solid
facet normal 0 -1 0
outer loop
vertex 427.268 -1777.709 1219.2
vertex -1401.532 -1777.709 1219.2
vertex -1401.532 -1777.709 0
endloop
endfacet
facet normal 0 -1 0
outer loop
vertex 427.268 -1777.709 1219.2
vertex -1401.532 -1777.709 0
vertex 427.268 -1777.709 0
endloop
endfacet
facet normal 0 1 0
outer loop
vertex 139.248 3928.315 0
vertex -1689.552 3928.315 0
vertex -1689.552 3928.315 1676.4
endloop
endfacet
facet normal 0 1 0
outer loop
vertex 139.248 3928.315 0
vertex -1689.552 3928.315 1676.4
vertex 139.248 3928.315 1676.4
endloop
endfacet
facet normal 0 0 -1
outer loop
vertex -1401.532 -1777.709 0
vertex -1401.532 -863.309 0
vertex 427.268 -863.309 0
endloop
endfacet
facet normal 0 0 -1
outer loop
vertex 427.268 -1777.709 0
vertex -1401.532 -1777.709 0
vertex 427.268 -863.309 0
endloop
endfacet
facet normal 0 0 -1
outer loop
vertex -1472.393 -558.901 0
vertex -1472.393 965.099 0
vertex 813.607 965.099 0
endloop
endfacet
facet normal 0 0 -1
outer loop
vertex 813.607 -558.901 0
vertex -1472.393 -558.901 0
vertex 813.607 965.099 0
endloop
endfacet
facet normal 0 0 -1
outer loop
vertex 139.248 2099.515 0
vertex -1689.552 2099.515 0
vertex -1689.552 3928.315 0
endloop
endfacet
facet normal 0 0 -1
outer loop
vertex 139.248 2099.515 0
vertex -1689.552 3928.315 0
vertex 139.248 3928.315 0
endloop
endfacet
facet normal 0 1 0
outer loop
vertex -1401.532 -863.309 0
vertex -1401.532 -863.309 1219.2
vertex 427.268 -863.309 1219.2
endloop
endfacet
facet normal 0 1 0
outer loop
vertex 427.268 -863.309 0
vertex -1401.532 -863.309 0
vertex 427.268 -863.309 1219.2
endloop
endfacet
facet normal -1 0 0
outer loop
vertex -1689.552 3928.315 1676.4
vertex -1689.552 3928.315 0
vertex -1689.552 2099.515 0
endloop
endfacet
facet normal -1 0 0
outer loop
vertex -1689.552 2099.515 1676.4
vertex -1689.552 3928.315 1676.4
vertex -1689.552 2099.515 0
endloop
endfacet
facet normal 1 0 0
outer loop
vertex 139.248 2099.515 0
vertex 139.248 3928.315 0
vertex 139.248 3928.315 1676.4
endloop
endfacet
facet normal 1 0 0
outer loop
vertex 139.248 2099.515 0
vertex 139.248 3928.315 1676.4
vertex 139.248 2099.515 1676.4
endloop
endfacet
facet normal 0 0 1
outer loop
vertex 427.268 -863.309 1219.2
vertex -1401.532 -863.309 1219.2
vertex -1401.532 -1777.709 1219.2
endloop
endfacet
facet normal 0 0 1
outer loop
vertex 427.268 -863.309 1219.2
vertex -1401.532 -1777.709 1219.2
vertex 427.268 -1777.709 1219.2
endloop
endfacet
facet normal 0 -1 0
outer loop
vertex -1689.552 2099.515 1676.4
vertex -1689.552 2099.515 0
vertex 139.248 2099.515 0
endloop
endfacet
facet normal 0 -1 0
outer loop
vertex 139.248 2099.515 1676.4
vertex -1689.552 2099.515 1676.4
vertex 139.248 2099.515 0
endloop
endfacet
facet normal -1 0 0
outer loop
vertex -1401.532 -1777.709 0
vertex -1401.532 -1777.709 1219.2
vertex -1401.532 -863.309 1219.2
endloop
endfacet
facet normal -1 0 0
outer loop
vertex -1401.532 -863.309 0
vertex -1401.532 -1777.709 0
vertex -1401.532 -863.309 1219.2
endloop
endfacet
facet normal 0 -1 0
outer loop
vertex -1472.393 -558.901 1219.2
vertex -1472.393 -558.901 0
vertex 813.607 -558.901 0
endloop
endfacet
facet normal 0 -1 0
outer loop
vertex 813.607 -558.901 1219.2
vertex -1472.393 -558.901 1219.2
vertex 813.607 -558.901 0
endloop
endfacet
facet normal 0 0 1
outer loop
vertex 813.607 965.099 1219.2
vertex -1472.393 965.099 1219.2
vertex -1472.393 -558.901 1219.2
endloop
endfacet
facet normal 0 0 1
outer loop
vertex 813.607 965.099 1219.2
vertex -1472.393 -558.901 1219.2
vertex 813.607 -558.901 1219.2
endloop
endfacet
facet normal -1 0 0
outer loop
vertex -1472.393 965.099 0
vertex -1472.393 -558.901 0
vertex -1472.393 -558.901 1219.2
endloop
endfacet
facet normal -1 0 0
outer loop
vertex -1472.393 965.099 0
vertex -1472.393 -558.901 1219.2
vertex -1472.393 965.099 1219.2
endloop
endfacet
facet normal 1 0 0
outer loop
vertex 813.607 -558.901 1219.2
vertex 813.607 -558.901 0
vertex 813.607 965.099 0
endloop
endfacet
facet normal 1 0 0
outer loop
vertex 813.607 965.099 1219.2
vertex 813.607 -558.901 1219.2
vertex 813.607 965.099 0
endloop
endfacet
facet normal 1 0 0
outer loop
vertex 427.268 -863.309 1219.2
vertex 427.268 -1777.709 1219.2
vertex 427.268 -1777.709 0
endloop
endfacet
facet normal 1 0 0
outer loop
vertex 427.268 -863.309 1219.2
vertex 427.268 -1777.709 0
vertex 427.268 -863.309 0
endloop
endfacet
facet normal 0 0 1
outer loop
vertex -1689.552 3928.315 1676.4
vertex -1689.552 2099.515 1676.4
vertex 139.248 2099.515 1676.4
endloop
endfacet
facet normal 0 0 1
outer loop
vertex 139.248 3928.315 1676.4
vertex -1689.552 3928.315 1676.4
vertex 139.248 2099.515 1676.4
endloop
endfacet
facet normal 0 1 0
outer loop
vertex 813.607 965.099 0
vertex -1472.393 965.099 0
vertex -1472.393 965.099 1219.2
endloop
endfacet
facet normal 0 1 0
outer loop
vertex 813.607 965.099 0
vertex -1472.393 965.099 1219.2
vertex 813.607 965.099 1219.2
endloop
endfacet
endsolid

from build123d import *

# Parameters (mm, degrees)
F0_W     = 2286
F0_H     = 1524
F1_DEPTH = 1219.2
F2_W     = 1828.8
F2_H     = 914.4
F3_DEPTH = 1219.2
F4_W     = 1828.8
F4_H     = 1828.8
F5_DEPTH = 1676.4


with BuildPart() as f1:
    # F0 (on Top) → F1 (new body)
    with BuildSketch(Plane.XY):
        with Locations((-329.392735, 203.098659)):
            Rectangle(F0_W, F0_H)
    extrude(amount=F1_DEPTH)


with BuildPart() as f3:
    # F2 (on face) → F3 (new body)
    with BuildSketch(Plane.XY.offset(1219.2)):
        with Locations((-487.131689, -1320.508897)):
            Rectangle(F2_W, F2_H)
    extrude(amount=-F3_DEPTH)


with BuildPart() as f5:
    # F4 (on face) → F5 (new body)
    with BuildSketch(Plane(origin=(0, 0, 0), x_dir=(1, 0, 0), z_dir=(0, 0, -1))):
        with Locations((-775.151894, -3013.914704)):
            Rectangle(F4_W, F4_H)
    extrude(amount=-F5_DEPTH)


solid = Compound([f1.part, f3.part, f5.part])
